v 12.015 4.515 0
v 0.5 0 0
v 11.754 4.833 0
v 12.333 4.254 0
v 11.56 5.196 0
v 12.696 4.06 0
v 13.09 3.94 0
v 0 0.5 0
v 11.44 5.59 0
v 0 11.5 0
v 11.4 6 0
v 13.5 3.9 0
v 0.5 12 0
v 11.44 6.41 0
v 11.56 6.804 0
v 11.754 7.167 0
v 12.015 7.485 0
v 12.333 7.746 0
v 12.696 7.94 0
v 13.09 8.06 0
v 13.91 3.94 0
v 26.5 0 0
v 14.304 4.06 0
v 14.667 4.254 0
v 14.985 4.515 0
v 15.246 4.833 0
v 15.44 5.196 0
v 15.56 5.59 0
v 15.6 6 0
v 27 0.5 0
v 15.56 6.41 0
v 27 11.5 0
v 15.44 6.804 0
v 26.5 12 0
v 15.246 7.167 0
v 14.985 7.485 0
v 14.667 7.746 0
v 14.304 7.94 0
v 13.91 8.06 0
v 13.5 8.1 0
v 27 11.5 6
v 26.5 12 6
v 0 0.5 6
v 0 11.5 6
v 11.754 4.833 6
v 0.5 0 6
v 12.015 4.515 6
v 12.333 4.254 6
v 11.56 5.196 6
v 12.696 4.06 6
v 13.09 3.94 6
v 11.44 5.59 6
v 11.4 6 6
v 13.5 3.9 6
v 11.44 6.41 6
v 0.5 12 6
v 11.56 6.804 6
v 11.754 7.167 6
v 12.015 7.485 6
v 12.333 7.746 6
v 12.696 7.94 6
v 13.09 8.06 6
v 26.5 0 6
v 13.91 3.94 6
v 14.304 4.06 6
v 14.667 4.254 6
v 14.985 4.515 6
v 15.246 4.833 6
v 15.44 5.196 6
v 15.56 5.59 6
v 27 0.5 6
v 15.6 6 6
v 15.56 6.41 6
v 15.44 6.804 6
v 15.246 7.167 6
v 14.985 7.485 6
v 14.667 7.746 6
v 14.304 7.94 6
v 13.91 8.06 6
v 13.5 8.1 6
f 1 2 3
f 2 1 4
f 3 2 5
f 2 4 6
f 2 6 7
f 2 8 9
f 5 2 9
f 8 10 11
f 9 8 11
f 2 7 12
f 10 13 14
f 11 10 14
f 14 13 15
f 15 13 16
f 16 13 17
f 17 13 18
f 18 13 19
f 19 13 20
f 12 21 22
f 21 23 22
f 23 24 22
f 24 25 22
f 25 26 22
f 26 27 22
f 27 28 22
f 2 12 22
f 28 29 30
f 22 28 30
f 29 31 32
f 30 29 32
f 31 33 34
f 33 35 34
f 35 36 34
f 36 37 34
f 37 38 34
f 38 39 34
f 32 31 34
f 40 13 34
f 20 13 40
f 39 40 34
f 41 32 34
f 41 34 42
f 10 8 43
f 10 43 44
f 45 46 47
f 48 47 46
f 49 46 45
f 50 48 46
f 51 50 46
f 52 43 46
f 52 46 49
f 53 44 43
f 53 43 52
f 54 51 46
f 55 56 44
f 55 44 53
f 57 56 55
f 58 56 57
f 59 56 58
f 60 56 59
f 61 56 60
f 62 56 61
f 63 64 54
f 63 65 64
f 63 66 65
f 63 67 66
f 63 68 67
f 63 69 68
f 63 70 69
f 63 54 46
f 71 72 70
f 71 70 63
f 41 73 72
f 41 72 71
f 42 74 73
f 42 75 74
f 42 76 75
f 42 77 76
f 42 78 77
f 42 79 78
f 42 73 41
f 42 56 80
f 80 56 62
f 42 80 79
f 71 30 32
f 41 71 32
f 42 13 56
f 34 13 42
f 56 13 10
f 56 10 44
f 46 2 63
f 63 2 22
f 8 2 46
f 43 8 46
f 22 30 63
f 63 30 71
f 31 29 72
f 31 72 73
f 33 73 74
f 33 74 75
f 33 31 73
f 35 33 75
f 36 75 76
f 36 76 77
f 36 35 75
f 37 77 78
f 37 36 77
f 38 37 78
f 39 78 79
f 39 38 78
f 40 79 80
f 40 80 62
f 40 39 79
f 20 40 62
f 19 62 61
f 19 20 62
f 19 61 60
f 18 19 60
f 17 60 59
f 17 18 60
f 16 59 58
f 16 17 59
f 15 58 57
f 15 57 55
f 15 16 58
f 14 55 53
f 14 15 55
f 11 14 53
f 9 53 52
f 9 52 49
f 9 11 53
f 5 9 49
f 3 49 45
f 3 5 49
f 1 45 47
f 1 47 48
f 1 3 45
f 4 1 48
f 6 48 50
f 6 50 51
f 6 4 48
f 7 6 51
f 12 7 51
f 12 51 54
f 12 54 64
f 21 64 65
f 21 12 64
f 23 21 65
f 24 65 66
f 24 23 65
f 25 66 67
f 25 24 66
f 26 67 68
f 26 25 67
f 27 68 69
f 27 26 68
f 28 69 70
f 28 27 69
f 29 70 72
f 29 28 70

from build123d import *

# Parameters (mm, degrees)
SKETCH1_W           = 27
SKETCH1_H           = 12
SKETCH1_R           = 2.1
BOSS_EXTRUDE1_DEPTH = 6
CHAMFER1_SIZE       = 0.5


with BuildPart() as part:
    # Sketch1 → Boss-Extrude1 (new body)
    with BuildSketch(Plane.XY):
        with Locations((13.5, 6)):
            Rectangle(SKETCH1_W, SKETCH1_H)
        with Locations((13.5, 6)):
            Circle(SKETCH1_R, mode=Mode.SUBTRACT)
    extrude(amount=BOSS_EXTRUDE1_DEPTH)

    # Chamfer1
    chamfer1_edges = [part.edges().sort_by_distance(p)[0] for p in [
        (0, 12, 3),
        (27, 12, 3),
        (27, 0, 3),
        (0, 0, 3),
    ]]
    chamfer(chamfer1_edges, length=CHAMFER1_SIZE)


solid = part.part
